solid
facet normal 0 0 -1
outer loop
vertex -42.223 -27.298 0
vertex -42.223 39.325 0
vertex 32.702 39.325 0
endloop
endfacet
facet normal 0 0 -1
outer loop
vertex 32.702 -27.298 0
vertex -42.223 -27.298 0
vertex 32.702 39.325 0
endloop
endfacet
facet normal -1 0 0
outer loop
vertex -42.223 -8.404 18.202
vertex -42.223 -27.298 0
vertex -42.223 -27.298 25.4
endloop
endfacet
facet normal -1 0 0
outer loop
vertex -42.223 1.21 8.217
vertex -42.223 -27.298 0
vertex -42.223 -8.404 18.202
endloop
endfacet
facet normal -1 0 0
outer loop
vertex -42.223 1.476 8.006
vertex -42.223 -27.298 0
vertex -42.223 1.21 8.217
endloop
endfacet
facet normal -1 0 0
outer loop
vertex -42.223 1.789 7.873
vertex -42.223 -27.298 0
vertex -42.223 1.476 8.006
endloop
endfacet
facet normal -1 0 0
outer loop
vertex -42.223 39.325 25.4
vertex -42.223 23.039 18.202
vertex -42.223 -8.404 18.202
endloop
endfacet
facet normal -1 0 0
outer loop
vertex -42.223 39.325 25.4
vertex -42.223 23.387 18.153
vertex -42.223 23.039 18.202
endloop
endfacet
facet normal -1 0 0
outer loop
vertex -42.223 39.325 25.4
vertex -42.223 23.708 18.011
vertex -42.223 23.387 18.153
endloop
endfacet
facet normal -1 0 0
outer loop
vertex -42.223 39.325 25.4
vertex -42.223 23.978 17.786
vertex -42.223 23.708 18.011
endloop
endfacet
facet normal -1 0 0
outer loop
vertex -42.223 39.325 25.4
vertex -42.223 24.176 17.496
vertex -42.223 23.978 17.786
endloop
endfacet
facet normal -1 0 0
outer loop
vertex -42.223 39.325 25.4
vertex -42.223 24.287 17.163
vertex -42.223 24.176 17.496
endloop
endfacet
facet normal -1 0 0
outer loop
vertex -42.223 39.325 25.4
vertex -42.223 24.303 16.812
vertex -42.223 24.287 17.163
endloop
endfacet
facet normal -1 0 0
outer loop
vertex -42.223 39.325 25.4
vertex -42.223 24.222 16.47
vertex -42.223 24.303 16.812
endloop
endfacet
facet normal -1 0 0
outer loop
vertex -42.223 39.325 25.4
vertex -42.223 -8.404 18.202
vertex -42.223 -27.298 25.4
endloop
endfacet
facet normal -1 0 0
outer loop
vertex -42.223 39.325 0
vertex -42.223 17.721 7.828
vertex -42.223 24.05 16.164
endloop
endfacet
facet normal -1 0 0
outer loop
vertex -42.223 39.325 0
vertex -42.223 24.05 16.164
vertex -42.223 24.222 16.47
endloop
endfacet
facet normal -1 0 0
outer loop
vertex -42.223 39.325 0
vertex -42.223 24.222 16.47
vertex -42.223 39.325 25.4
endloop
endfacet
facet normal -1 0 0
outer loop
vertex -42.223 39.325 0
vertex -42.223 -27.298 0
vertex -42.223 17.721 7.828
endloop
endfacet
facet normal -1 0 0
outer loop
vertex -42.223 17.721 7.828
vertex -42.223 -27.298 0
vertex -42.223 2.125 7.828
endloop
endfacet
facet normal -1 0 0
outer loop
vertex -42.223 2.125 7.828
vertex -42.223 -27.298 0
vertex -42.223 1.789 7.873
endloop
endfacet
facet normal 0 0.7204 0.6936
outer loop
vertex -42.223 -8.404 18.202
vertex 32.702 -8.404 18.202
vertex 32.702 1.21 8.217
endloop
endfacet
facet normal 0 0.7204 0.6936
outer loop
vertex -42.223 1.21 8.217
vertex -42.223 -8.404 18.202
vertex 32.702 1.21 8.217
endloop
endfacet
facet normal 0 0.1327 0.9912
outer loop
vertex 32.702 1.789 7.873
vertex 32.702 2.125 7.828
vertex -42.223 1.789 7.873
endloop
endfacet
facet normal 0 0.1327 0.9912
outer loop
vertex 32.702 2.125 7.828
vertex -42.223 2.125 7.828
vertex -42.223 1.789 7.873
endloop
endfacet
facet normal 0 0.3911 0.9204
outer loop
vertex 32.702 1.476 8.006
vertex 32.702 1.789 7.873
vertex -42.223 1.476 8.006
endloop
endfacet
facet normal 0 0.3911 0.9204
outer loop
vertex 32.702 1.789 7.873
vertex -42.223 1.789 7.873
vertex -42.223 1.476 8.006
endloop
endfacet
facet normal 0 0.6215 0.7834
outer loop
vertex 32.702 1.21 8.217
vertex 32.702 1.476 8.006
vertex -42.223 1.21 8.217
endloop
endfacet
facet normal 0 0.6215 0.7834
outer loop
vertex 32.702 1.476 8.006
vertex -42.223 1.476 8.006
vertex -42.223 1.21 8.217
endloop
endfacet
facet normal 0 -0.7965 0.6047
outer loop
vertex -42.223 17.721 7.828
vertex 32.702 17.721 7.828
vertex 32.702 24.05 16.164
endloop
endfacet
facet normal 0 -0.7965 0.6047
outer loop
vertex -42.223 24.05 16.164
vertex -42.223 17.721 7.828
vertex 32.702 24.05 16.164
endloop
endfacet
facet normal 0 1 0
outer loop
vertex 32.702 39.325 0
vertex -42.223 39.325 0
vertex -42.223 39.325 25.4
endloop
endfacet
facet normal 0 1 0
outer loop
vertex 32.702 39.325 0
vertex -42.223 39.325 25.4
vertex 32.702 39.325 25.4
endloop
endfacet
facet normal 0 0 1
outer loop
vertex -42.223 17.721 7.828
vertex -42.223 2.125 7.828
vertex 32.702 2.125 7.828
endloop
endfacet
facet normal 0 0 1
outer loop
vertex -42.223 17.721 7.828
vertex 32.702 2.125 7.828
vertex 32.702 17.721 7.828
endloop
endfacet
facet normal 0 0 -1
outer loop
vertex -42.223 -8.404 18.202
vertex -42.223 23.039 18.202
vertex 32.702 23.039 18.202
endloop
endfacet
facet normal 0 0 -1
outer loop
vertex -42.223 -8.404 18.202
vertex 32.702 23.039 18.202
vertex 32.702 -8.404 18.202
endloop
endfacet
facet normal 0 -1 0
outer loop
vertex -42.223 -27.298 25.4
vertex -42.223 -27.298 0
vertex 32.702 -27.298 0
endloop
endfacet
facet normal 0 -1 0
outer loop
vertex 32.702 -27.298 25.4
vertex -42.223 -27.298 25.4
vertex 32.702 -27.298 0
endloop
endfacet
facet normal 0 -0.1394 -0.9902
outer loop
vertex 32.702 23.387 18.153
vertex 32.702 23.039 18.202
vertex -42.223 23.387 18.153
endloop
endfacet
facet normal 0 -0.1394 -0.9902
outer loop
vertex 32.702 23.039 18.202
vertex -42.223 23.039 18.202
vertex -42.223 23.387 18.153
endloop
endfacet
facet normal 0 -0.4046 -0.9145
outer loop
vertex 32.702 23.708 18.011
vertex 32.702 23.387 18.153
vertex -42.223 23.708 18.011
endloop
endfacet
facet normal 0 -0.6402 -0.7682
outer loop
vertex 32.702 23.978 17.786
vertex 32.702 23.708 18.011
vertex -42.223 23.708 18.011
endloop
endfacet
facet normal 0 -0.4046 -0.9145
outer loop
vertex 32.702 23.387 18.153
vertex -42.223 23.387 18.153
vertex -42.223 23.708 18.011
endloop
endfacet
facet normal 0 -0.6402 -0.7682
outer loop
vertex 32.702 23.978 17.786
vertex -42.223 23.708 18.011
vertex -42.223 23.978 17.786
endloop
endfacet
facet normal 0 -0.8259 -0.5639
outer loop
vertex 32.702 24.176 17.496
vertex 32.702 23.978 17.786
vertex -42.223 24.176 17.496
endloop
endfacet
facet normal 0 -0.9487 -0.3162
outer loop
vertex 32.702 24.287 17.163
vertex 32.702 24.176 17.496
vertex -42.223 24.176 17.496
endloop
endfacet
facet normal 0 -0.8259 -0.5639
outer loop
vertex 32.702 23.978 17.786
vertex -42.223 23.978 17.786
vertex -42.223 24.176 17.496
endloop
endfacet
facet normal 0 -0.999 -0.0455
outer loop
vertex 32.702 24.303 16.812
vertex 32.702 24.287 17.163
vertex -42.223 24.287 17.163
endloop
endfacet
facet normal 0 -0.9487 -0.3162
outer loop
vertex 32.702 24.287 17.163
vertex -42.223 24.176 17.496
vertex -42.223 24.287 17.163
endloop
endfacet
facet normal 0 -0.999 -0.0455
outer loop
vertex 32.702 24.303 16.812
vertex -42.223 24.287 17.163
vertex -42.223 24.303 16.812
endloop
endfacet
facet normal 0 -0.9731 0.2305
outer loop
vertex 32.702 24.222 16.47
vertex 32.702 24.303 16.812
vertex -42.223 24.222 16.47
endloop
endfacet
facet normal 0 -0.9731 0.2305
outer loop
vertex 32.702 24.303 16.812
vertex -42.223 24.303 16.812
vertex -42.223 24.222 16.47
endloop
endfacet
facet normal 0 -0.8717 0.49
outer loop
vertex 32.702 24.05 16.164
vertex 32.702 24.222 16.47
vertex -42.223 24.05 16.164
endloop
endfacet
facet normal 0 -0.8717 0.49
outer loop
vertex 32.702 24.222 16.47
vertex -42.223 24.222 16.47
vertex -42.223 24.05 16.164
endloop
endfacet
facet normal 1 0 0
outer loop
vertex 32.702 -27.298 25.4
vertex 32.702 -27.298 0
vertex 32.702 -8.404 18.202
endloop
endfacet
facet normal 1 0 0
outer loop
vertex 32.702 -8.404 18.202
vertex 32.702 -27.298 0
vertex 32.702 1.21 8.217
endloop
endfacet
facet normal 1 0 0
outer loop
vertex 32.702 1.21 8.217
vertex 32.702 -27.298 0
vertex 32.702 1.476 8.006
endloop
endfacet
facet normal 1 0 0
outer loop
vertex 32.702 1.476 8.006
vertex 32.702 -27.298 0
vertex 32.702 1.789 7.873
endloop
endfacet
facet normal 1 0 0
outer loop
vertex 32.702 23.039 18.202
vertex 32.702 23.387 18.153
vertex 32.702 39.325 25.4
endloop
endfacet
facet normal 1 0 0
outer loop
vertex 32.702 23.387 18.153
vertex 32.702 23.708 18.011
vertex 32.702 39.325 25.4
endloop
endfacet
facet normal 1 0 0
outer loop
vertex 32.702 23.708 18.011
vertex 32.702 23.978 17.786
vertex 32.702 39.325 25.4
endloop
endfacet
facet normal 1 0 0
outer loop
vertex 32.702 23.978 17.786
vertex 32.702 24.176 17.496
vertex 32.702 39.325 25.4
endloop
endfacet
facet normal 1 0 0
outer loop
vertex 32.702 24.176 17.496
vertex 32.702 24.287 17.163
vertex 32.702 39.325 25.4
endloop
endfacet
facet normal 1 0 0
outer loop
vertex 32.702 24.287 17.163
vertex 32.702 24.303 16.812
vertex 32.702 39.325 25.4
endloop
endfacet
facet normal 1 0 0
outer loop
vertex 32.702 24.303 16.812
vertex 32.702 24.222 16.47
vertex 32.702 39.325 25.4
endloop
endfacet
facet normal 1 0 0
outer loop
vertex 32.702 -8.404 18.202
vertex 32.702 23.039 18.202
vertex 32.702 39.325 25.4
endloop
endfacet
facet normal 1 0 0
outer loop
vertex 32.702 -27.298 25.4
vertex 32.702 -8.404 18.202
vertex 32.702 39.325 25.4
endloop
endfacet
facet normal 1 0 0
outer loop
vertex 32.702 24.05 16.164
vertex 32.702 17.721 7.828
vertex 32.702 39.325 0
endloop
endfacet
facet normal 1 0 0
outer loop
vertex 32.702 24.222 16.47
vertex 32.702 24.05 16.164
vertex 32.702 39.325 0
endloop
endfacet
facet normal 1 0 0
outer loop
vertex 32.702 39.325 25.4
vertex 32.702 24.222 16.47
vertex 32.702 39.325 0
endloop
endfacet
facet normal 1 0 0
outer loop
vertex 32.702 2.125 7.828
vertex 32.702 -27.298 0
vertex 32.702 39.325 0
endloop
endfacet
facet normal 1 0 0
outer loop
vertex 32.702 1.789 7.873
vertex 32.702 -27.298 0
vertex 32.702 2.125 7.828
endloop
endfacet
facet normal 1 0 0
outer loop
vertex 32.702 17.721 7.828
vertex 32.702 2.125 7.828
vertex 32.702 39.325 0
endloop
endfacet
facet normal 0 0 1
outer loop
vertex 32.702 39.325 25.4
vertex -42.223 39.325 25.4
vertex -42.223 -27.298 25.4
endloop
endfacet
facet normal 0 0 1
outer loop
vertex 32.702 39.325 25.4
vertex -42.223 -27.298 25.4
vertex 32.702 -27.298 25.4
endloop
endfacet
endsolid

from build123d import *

# Parameters (mm, degrees)
F0_W     = 74.9250464141
F0_H     = 66.6232015938
F1_DEPTH = 25.4
F3_DEPTH = 84.074
F4_R     = 1.27


with BuildPart() as f1:
    # F0 (on Top) → F1 (new body)
    with BuildSketch(Plane.XY):
        with Locations((-4.7604274005, 6.0135135427)):
            Rectangle(F0_W, F0_H)
    extrude(amount=F1_DEPTH)

    # F2 (on face) → F3 (cut)
    with BuildSketch(Plane.YZ.offset(32.7020958066)):
        Polygon((25.5974382162, 18.2015541941), (-8.4044123068, 18.2015541941), (1.5848320909, 7.8281089664), (17.7213028073, 7.8281089664), align=None)
    extrude(amount=-F3_DEPTH, mode=Mode.SUBTRACT)

    # F4
    f4_edges = [f1.edges().sort_by_distance(p)[0] for p in [
        (-4.760427, 1.584832, 7.828109),
        (-4.760427, 25.597438, 18.201554),
    ]]
    fillet(f4_edges, radius=F4_R)


solid = f1.part
